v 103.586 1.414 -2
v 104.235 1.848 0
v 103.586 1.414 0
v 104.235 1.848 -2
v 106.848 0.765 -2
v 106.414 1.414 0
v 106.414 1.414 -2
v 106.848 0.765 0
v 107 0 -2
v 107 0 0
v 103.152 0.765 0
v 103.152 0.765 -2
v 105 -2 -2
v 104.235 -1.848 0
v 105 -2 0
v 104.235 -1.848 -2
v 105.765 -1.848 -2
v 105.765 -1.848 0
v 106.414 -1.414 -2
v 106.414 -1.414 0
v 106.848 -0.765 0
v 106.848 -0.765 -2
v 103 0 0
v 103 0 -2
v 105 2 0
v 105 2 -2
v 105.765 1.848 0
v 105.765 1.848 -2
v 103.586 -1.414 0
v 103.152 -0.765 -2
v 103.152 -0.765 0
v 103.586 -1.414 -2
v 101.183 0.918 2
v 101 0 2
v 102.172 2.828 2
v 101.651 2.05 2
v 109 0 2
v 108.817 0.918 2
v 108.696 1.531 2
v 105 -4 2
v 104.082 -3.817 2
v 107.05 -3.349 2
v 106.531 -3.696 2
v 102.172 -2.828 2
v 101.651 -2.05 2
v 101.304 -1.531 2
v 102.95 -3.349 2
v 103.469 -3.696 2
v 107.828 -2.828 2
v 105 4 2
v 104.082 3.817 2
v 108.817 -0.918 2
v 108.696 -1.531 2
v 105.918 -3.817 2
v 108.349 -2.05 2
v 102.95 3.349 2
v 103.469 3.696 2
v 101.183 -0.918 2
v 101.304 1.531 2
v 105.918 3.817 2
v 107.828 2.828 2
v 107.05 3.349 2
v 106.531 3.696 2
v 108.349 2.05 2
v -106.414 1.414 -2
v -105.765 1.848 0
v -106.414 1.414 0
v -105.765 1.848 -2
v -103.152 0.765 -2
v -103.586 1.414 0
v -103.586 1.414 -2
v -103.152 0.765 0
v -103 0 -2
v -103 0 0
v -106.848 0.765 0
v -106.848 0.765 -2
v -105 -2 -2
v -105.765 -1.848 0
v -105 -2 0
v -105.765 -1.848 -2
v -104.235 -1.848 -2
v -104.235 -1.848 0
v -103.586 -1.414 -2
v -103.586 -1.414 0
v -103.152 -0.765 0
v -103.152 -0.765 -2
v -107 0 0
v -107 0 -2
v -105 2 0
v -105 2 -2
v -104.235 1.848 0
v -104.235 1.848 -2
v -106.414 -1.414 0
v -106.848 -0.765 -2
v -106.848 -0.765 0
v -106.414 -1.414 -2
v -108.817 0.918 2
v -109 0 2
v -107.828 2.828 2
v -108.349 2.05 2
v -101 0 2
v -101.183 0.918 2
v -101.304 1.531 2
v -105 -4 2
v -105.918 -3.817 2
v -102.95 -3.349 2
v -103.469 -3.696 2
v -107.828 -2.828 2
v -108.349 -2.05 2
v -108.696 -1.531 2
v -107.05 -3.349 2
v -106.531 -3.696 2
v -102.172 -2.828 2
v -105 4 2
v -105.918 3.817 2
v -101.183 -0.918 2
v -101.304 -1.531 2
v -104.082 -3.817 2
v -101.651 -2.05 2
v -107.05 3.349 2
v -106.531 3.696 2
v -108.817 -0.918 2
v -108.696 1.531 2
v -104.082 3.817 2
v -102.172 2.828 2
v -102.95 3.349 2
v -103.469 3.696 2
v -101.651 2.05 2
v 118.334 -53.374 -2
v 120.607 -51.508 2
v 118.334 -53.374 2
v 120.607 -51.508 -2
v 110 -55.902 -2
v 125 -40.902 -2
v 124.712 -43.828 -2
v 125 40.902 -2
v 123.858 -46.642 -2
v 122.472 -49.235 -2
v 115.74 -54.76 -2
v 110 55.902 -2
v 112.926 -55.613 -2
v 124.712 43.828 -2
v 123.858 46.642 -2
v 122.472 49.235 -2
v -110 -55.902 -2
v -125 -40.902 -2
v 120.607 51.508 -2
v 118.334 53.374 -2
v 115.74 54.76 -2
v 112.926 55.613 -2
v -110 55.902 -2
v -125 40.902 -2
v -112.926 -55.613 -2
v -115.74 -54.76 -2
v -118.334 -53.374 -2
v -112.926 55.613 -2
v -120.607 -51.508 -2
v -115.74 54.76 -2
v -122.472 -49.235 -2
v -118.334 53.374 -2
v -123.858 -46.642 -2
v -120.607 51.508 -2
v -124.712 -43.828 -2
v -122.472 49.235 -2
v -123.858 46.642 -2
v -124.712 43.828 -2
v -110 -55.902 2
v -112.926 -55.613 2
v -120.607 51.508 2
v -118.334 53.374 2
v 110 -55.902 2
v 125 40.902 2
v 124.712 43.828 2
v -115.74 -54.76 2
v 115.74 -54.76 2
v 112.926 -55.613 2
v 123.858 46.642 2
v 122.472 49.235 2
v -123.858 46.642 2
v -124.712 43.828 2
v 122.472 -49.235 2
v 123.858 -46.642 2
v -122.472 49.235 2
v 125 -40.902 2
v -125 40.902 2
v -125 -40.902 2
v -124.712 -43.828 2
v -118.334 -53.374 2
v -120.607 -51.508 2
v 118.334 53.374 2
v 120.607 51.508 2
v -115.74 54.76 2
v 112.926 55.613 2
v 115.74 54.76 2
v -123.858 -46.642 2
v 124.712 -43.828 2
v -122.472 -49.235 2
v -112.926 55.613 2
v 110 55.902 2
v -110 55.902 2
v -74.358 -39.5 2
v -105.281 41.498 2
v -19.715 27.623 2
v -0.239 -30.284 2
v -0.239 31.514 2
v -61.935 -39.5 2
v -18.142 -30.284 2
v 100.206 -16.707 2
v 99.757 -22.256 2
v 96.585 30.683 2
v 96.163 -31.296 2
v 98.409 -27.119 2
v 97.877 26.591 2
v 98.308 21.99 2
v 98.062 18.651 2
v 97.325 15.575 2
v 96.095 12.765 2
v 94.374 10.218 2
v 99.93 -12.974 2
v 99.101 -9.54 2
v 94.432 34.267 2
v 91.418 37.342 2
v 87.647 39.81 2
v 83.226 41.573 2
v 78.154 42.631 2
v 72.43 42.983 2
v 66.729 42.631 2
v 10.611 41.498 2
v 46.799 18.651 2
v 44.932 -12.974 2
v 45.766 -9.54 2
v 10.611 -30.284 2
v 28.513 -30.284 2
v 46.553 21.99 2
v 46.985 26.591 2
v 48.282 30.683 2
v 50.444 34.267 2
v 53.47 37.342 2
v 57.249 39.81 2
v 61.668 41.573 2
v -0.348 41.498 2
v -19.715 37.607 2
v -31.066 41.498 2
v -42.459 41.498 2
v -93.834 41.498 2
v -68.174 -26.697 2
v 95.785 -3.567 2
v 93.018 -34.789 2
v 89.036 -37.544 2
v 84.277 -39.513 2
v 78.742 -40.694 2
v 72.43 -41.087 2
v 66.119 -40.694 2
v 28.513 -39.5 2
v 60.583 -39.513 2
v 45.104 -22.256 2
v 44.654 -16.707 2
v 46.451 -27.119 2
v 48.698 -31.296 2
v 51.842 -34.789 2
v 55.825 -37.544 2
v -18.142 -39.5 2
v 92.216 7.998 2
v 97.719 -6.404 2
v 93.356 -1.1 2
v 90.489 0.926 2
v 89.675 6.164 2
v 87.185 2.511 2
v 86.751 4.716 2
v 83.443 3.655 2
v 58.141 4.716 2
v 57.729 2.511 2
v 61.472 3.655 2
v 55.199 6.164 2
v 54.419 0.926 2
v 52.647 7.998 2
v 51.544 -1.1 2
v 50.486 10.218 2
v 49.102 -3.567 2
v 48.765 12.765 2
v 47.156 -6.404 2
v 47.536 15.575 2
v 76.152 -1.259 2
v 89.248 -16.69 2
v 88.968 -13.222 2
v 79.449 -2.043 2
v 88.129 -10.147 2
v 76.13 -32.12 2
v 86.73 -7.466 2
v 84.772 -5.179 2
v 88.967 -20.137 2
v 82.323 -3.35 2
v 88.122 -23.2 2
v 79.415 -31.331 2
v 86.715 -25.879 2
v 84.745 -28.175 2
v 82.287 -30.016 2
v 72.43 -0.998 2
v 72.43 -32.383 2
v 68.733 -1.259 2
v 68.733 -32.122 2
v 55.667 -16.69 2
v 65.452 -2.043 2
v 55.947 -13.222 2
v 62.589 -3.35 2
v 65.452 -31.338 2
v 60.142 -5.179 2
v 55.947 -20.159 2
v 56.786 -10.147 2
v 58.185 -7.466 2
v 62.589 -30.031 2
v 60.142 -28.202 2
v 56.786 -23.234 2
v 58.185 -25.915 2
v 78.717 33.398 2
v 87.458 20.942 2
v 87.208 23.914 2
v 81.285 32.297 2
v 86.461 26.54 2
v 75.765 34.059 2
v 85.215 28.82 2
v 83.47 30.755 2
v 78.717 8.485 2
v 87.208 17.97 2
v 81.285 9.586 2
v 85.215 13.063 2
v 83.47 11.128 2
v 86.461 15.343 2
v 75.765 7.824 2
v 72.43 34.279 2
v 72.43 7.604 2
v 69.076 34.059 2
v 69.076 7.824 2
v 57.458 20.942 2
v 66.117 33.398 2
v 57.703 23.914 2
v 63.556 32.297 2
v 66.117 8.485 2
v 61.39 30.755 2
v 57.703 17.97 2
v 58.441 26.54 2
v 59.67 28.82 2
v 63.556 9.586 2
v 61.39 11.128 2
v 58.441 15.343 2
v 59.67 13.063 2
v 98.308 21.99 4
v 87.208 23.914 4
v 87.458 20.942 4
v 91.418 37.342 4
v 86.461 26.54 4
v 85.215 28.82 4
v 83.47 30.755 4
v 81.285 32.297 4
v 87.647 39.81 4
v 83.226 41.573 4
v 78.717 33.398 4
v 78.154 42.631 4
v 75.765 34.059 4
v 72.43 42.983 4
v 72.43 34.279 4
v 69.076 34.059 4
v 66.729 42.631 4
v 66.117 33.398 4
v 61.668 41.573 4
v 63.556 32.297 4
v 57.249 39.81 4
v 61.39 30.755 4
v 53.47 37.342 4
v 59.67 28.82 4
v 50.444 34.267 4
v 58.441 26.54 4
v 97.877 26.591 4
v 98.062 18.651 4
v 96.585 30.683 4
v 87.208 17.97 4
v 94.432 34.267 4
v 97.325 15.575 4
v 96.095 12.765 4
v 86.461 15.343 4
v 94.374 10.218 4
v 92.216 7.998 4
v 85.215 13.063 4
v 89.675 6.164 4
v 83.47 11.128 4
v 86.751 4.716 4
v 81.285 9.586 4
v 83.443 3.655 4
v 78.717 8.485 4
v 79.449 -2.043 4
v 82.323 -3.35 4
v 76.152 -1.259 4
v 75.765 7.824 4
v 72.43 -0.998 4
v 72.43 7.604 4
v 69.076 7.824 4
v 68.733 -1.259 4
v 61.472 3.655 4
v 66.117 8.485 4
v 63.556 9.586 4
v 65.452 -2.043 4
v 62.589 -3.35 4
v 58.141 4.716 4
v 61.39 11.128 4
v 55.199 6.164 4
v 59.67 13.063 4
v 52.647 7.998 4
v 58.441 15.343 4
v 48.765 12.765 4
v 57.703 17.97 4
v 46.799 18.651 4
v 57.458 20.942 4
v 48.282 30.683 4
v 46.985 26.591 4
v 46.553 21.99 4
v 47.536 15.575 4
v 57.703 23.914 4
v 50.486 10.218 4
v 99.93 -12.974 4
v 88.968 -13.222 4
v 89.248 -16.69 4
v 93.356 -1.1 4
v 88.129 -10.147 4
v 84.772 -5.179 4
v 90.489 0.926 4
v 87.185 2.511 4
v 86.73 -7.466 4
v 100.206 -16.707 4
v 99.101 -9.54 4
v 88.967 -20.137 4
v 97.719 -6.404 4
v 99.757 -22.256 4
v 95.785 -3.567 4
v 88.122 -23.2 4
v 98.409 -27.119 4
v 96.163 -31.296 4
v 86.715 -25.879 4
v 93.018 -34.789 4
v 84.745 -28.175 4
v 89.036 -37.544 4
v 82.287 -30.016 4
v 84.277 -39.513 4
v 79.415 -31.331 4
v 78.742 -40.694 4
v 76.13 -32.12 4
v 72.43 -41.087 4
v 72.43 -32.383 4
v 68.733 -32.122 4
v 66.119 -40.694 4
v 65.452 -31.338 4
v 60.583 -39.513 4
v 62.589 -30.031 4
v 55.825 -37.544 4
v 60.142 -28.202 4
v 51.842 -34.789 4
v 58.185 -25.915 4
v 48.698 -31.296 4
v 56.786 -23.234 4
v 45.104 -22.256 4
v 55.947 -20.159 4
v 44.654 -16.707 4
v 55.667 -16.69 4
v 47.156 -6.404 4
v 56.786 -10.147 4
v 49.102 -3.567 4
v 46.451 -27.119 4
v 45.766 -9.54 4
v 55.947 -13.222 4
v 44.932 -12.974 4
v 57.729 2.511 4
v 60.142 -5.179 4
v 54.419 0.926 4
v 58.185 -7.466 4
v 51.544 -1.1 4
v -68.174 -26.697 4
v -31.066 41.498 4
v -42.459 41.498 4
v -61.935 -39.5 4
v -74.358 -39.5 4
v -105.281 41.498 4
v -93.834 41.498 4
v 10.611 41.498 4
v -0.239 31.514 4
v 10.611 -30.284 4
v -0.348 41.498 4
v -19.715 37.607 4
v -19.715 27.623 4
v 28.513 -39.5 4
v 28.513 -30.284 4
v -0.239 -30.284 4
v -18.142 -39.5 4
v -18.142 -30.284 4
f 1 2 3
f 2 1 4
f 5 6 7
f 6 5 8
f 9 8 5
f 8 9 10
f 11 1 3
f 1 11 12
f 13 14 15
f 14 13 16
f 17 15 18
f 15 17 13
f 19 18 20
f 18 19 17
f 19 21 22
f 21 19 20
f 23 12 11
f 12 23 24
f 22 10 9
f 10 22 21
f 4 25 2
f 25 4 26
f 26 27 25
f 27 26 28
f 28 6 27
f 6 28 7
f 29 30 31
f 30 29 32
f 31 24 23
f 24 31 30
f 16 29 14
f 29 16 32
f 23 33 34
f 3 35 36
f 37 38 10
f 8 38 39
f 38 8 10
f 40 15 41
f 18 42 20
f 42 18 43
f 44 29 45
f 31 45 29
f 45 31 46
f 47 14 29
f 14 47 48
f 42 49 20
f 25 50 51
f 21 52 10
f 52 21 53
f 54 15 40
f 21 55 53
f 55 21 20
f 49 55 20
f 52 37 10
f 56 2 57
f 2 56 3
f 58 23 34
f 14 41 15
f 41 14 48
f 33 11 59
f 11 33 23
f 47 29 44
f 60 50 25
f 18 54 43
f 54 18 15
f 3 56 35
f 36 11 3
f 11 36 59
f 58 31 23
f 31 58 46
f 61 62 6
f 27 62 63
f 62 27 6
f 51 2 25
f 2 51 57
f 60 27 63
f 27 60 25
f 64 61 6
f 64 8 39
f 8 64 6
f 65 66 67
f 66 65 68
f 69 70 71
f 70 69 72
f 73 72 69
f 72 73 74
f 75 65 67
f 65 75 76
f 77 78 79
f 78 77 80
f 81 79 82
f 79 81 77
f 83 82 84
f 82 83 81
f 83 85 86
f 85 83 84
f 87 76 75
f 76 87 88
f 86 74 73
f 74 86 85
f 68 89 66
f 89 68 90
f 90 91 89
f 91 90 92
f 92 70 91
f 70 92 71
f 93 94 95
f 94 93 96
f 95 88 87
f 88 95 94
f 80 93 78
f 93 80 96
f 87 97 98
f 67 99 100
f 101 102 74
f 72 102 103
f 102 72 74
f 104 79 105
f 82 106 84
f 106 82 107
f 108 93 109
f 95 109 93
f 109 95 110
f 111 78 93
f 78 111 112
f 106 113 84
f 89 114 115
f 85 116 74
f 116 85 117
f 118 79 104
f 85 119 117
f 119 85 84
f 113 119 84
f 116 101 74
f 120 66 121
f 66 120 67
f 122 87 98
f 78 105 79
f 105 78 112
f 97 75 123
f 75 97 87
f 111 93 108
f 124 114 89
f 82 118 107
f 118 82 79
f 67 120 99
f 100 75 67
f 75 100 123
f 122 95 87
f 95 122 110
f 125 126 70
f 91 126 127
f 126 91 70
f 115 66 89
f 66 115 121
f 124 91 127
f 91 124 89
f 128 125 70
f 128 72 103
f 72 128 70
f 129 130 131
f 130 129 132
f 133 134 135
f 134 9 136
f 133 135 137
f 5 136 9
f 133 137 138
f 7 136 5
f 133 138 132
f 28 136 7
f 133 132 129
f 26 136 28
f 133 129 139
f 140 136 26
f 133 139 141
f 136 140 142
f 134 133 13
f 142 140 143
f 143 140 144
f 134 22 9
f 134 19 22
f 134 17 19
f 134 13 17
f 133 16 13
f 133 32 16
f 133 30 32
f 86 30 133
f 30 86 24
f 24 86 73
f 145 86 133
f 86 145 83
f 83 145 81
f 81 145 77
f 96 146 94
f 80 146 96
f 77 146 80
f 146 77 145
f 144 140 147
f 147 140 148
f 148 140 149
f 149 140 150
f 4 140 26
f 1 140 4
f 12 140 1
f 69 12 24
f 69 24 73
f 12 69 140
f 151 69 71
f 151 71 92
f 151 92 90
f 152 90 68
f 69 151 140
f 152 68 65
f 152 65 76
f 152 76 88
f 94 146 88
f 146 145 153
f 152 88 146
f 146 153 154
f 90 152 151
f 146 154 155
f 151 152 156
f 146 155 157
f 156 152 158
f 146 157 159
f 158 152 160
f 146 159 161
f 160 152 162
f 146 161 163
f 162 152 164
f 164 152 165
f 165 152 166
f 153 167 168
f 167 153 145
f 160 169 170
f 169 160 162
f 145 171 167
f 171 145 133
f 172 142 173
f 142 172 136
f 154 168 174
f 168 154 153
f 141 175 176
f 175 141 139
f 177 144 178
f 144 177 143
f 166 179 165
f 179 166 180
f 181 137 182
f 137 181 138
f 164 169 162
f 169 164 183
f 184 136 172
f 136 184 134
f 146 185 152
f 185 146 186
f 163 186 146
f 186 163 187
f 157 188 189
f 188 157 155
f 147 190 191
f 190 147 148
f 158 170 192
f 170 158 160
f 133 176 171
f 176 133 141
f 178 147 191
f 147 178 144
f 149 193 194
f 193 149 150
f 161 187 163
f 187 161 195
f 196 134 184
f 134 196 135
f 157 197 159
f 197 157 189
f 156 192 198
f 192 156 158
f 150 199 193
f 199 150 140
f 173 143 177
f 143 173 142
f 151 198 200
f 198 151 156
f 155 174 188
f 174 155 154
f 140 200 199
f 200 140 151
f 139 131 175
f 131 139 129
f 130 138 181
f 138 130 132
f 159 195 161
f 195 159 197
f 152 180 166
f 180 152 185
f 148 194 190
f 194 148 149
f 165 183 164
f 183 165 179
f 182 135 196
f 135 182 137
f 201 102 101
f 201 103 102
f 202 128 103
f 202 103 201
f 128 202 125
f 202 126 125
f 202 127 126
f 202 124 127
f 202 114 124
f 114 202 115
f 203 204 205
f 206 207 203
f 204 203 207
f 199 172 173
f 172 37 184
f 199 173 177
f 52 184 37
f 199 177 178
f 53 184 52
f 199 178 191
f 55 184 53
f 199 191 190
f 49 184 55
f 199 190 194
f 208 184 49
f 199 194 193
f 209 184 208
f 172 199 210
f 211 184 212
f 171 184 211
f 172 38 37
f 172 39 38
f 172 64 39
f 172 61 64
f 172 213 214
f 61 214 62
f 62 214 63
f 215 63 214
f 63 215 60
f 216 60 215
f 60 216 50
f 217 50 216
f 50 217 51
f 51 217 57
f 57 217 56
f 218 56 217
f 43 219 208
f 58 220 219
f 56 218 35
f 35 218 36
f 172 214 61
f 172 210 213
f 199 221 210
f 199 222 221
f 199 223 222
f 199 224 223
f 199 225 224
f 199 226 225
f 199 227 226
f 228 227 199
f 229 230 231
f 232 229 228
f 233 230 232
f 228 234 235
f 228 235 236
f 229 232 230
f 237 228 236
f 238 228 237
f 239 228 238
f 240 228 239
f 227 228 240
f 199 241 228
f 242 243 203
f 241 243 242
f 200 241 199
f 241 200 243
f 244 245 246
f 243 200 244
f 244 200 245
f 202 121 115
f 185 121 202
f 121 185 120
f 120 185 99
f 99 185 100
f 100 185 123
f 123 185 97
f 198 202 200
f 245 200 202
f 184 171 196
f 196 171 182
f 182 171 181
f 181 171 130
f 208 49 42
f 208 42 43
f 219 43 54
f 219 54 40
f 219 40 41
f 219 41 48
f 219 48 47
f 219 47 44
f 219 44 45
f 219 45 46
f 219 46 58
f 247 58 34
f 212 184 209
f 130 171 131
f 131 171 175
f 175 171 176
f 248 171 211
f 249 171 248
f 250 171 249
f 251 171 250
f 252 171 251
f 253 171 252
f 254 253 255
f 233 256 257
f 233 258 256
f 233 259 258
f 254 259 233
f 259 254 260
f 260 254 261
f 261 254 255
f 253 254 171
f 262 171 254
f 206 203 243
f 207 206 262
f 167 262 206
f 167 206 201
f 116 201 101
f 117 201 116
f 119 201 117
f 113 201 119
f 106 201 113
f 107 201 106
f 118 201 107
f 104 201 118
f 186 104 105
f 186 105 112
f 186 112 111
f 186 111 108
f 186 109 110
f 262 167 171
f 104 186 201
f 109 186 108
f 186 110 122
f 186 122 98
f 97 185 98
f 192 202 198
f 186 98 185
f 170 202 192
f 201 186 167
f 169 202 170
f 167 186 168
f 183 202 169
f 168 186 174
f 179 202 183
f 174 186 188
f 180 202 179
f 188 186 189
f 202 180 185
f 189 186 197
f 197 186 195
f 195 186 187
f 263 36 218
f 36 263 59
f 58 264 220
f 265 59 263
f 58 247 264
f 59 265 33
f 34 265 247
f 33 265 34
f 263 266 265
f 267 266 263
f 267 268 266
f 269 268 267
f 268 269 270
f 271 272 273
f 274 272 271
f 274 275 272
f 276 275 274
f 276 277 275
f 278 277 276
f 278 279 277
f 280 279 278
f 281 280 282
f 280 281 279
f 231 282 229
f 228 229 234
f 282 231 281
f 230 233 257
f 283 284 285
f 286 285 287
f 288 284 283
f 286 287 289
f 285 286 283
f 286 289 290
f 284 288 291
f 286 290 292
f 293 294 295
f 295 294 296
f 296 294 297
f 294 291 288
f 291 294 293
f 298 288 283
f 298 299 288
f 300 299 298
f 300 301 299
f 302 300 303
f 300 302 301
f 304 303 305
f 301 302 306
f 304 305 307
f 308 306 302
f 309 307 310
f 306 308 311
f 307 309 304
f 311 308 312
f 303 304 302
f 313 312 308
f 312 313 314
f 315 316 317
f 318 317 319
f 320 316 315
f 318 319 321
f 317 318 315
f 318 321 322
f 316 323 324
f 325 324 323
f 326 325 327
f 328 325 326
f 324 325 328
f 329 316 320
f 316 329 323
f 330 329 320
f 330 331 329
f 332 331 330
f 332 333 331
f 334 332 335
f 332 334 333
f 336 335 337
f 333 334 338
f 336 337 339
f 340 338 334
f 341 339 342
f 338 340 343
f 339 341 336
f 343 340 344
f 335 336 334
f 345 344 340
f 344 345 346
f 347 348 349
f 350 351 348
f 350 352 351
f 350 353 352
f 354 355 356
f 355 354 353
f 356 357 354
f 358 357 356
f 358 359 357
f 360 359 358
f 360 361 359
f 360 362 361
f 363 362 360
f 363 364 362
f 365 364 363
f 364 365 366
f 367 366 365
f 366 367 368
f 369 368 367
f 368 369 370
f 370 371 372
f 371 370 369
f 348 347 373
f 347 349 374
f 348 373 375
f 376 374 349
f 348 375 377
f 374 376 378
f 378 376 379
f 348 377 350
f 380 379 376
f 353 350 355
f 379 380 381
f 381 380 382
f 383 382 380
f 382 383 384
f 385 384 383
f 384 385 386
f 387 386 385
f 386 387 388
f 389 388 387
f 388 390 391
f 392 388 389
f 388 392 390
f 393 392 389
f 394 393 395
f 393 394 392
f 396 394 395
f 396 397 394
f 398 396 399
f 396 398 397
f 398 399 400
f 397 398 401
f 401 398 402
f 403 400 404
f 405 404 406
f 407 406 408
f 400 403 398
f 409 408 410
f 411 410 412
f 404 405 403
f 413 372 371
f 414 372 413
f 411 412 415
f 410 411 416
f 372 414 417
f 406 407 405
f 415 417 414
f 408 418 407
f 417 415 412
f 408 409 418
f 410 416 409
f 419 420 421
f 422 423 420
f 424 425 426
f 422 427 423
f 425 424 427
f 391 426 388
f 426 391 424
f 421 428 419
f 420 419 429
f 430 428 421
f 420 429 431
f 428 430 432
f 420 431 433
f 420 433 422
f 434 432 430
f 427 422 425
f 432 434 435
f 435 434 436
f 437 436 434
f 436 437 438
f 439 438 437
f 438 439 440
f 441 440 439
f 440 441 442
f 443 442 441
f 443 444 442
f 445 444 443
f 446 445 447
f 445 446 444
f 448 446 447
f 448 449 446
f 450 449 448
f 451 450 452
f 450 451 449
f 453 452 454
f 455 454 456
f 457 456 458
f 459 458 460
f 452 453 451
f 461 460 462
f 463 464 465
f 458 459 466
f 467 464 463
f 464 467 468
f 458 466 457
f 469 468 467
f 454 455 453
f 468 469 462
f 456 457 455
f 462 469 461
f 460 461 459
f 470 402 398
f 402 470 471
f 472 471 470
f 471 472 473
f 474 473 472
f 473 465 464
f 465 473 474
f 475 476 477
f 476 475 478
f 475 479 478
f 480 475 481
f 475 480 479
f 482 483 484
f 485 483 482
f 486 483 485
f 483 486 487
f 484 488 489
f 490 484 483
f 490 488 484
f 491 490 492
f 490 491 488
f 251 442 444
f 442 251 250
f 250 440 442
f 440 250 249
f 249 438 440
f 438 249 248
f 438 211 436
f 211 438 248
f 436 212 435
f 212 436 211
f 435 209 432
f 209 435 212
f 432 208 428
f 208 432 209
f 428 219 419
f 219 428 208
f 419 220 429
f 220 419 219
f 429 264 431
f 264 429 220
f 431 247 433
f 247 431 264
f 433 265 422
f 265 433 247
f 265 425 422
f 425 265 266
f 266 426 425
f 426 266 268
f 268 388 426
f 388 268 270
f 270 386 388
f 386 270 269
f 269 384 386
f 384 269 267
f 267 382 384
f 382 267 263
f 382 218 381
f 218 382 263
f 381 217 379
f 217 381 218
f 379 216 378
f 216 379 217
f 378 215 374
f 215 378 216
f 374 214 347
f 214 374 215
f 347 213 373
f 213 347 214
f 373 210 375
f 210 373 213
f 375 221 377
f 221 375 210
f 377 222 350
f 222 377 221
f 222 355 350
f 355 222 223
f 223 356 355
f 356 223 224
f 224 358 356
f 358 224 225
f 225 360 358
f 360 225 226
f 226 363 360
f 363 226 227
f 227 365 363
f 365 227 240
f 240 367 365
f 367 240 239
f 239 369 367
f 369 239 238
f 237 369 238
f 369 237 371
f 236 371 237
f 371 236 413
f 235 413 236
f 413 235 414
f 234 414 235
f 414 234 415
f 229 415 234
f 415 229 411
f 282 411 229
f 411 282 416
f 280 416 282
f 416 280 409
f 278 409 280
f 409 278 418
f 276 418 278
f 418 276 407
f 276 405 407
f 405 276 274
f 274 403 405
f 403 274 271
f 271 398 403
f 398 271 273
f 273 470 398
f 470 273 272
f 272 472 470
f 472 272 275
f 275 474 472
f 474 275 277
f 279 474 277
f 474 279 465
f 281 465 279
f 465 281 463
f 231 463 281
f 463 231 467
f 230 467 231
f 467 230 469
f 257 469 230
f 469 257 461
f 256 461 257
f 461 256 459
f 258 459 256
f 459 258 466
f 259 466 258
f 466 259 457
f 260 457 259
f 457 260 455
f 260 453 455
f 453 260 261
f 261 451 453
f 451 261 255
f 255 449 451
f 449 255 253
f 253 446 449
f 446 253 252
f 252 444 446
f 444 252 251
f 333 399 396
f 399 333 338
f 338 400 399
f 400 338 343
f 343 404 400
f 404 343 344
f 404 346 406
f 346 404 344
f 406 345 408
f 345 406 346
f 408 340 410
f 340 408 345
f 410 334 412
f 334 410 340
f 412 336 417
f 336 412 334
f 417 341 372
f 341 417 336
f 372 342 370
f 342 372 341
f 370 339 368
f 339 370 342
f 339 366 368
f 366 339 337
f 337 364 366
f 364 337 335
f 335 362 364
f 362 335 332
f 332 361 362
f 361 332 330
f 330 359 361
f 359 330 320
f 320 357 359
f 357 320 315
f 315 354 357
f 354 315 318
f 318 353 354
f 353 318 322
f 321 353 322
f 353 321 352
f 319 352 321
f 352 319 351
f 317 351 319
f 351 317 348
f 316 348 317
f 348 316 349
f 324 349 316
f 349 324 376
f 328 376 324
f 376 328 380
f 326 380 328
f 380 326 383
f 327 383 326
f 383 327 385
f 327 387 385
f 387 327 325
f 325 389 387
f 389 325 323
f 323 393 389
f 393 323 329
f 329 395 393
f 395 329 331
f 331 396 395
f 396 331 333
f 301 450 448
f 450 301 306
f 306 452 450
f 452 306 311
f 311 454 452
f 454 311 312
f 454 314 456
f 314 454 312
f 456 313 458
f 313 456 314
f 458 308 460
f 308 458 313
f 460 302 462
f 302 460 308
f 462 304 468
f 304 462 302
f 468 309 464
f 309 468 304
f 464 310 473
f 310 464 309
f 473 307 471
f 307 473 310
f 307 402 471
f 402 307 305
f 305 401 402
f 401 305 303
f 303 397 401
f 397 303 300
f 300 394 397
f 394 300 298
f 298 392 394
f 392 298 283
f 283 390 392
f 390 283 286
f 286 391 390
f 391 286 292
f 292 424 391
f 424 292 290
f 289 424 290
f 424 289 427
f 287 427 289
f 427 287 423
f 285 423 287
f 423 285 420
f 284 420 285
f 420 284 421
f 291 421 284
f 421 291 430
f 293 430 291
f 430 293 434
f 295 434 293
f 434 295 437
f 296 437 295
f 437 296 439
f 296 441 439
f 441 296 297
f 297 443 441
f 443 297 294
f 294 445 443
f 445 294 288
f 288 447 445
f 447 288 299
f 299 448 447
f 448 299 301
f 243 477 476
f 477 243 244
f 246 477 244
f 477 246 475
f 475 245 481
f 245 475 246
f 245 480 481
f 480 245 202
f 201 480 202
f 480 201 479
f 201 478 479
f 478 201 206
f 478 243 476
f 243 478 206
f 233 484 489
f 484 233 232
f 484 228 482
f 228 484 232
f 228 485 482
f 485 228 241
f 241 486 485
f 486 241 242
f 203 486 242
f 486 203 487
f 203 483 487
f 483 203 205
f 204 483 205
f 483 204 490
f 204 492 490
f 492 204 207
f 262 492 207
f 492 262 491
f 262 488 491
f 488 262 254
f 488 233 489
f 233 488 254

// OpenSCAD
w = 250;
h = 250 / sqrt(5);
e = 4;
r = 15;

difference() {
	minkowski() {
		cube([w-15*2,h-15*2,e-1], center = true);
		cylinder(1,r,r,center = true,$fn=32);
	}
	translate([105,0,0]) 
		screew_hole();
	translate([-105,0,0]) 
		screew_hole();
}

translate([0,0,e/2])
	linear_extrude(2)
		text("V18", 80, "DejaVu Sans:style=Condensed Bold",halign="center", valign="center" );


module screew_hole() {
	cylinder(10,2,2,center = true, $fn = 16);
	cylinder(10,2,12, $fn = 16);
}
